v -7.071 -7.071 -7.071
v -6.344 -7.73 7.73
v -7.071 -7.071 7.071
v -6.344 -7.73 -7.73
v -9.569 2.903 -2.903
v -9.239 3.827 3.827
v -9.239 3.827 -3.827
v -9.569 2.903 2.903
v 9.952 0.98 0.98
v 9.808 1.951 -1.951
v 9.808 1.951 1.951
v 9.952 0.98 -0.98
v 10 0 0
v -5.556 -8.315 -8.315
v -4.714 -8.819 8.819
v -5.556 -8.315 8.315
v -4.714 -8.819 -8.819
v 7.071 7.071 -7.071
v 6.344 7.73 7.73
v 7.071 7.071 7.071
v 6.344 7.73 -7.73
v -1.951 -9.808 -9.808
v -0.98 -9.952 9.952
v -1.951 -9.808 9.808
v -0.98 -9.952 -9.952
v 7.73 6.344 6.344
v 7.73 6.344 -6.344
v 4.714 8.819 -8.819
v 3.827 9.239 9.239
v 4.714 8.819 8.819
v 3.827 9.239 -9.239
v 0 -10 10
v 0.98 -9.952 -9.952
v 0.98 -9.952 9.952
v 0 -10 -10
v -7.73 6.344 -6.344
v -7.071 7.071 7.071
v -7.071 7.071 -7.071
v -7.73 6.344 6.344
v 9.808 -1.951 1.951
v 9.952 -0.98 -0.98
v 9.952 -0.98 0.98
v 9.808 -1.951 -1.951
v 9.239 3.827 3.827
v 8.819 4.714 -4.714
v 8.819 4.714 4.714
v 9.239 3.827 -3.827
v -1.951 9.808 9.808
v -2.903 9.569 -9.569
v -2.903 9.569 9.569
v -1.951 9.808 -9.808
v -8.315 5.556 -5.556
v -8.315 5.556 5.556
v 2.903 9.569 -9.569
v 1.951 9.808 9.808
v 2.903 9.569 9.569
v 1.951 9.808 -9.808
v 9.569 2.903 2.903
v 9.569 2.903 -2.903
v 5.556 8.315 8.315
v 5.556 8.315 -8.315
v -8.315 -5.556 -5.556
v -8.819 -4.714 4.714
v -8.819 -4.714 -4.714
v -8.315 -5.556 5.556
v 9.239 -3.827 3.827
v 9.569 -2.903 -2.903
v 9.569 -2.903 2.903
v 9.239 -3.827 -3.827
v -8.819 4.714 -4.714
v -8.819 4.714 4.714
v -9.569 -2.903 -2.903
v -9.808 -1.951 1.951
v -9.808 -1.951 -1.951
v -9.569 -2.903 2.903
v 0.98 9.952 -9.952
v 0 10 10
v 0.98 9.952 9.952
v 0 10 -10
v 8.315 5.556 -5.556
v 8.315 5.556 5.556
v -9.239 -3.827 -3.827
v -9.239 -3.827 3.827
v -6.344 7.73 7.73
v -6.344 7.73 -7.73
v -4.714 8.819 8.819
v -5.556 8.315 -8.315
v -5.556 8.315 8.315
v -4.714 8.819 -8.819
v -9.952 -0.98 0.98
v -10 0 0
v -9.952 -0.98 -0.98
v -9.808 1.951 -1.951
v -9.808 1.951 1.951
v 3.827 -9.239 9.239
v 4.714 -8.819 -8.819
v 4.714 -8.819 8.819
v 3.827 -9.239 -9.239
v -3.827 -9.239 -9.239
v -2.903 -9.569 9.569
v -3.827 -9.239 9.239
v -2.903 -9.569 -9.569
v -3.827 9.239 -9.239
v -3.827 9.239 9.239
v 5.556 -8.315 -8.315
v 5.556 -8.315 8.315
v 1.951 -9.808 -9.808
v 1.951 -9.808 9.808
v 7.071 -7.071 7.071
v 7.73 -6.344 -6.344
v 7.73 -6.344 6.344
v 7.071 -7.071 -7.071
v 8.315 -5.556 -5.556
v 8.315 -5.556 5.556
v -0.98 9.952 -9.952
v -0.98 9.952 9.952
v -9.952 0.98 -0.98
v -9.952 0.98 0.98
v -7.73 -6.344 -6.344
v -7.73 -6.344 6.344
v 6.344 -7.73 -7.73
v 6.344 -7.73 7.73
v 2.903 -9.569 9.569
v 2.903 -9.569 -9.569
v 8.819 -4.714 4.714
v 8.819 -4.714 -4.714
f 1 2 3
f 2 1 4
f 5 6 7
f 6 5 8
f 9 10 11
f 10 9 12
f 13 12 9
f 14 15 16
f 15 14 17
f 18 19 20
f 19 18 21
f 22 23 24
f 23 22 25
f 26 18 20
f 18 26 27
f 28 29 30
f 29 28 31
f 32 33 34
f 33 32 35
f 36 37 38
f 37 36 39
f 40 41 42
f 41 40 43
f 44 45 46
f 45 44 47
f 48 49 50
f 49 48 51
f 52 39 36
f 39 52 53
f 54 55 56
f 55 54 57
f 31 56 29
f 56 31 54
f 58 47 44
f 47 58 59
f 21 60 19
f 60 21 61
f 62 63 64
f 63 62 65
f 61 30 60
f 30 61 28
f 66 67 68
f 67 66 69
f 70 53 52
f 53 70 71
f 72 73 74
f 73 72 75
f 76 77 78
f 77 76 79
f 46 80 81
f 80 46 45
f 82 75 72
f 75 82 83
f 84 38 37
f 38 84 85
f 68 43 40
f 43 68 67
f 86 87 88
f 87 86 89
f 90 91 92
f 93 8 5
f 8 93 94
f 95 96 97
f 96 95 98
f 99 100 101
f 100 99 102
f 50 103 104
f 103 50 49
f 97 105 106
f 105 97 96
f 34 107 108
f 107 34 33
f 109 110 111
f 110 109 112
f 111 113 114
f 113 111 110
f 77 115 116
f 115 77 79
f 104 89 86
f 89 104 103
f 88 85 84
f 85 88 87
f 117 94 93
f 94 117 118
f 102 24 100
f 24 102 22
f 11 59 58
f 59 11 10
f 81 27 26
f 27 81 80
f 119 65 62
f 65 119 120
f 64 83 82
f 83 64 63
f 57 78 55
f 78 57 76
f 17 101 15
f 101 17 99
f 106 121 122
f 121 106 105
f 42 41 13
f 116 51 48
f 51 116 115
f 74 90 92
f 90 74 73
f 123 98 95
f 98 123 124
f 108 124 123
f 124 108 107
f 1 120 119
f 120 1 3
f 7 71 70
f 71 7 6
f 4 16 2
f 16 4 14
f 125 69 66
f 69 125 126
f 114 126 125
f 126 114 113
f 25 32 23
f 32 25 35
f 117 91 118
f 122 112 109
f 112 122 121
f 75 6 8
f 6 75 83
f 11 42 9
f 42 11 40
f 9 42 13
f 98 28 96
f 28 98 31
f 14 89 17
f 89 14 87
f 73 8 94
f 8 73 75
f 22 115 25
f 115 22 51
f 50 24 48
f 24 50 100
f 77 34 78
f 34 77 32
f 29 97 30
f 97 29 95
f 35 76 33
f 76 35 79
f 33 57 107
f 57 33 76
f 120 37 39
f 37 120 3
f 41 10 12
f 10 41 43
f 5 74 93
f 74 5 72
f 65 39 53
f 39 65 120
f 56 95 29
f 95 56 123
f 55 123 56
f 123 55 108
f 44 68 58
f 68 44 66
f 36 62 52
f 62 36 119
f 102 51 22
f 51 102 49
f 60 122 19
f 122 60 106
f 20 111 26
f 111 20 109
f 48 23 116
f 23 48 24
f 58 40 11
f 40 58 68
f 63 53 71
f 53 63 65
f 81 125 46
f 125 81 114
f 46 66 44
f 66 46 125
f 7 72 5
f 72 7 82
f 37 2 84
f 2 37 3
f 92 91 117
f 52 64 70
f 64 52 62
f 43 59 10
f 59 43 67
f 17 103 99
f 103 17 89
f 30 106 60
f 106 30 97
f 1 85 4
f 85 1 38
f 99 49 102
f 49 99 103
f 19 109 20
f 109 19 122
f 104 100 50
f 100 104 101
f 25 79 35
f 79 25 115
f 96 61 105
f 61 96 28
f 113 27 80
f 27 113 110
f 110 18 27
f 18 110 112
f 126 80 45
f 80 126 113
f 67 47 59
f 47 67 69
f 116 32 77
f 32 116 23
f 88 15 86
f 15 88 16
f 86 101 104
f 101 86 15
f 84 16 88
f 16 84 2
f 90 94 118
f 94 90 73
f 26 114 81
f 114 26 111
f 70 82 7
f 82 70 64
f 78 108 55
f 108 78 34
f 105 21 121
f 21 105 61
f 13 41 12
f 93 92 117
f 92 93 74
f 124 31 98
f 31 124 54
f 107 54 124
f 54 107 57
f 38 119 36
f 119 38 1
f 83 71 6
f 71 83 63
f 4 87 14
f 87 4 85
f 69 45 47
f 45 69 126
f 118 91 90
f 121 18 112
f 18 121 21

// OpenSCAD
// Two equal cylinders crossing at right angles: an intersection curve with a
// closed form, which is what this fixture is for.
//
// Everywhere else in this suite a trim boundary is the mesh's own polyline, and
// there is nothing to compare it against - a boolean's cut through a tessellated
// solid has no analytic description, so "the boundary is where it should be" is
// not a statement any fixture could check. Here it does have one, and every
// figure below follows from it rather than from an export.
//
// The model. cylinder() runs along z, so the first is x^2 + y^2 = r^2, and
// rotate([90, 0, 0]) carries z onto -y, so the second is x^2 + z^2 = r^2. They
// meet where y^2 = z^2: the two planes z = y and z = -y. In each of those the
// section of either cylinder is an *ellipse* - semi-axis r across it, along x,
// and r/cos(45) = r*sqrt(2) down its slope, so 10 and 14.14213562 here. Those
// two ellipses are the whole of the intersection.
//
// EXPECT: 2 analytic surfaces available (2 cylindrical, 0 spherical, 0 toroidal, 0 Bezier), and 4 declared planes
//
// Who owns which surface is the model's to say, and it says each solid
// declared one cylinder and nothing else. Measured from positions it came out
// otherwise: 76 facets of each cylinder are slivers along the crease whose
// every corner is on the crossing curve - on *both* cylinders - and near the
// crease the two normals agree within the 60 degrees that rule allowed, so
// each solid "owned" the other's cylinder too. Carried ownership plus a D0
// presence test names one surface per solid, so no ownership line may name two.
// See doc/step-export-wip.md, open item 31.
// EXPECT: provenance maps 2 of 2 originals onto 2 of 2 declared surfaces
// EXPECT-NOT: cut), cylinder
// APPROX-NOT: cut), cylinder
//
// No plane survives: each cylinder's caps sit at |z| = 20 and the other reaches
// only to 10, so both are cut away entirely. That is what makes this a closed
// shell of nothing but quadrics, and a clean test of a boundary.
//
// How many faces. On the z-axis cylinder the surviving region is
// |z| <= r*|sin theta|, which pinches to a point at theta = 0 and 180. So what
// survives is two lobes of exactly 180 degrees, four lobes over the two
// cylinders, and each lobe is written as two faces - 180 degrees is the widest
// a region can be before a face on an open rectangle becomes ambiguous. Eight
// faces, and they come out as the quadrants: theta 0-90, 90-180, 180-270,
// 270-360, thirty-three boundary vertices each.
// EXPECT: 8 trimmed quadrics written as one face each, replacing 128 facets
//
// 128 facets is the same number the refusing export used to write as 128 planes,
// and it is the model's: each cylinder is a 64-gon, and |z| <= r*|sin theta| is
// a single interval of z for every one of the 64 columns, so every column
// survives as one merged strip and none is cut in two. 64 from each cylinder.
//
// What bounds a face. Each quadrant is bounded above by z = +r*sin theta and
// below by z = -r*sin theta - one arc of each ellipse - and those two meet at
// the pinch, theta = 0 or 180, where the region closes to a point on its own.
// The only other side is the ruling at theta = 90 or 270 where the lobe was
// halved. Three edges, not four, and the reason is that a plane section climbs
// as it goes round: two of them cross, where two rims at constant height never
// could. validatestep.py knows that shape.
//
// So: two ellipses, each cut into four arcs by the two pinches and the two
// quadrant splits, is 8 arcs; two rulings on each cylinder is 4 lines; 12
// distinct edges, every one of them shared by exactly two of the eight faces.
// ROUNDTRIP: Cylinder=8
/// EDGES: Ellipse=8 Line=4
//
// And the two planes are the model's, not the mesh's: the pencil of the two
// cylinders, x^2 + y^2 - 100 less x^2 + z^2 - 100, is y^2 - z^2 - the pair
// z = y, z = -y - so the ellipses are a closed form of the two declarations
// (D1), where they were found by fitting the crossing, seeing the fit flat,
// and taking the plane from the mesh's own vertices (open item 39, R7).
/// EXPECT: 0 on one taken from the mesh, 8 on one the pencil of the two surfaces it is the crossing of states (D1)
// And their class is proved, not taken from how they were found: each of the
// twelve edges is certified on both its faces' cylinders in closed form, D1
// (brep::stateClasses) - the routing chooses which curve is written, never its
// class.
// EXPECT: edges 12 D1, 0 D2, 0 D4
//
// And the figure none of the above can fake. The solid two equal cylinders cut
// from each other is the Steinmetz solid, whose volume is exactly 16*r^3/3 -
// no pi in it, which is the pleasant surprise of the shape. 16*1000/3 is
// 5333.33333, and OpenCASCADE measures the exported solid at 5333.333262: 1.3e-8
// relative, which is the kernel's own integration and not the model's.
//
// The number is what makes this fixture worth having. Every other expectation
// here is a census of what this exporter wrote, so it locks the behaviour in but
// cannot say it was ever right; this one was worked out from r alone and the
// kernel that measures it has no access to the arithmetic that predicted it.
// When the boundary was the mesh's chords the same export measured 5320.49 -
// 12.8 low, 0.24 per cent, the chords cutting inside the ellipse all the way
// round both curves. Nothing in the census moved when that was fixed except the
// surface names; the volume is the only line that knew the difference.
// VOLUME: 5333.33333
//
// The approximation flag has nothing left to approximate here.
// ROUNDTRIP-APPROX: Cylinder=8
// VOLUME-APPROX: 5333.33333
$fn = 64;
r = 10;
h = 40;
intersection() {
	cylinder(r = r, h = h, center = true);
	rotate([90, 0, 0]) cylinder(r = r, h = h, center = true);
}
